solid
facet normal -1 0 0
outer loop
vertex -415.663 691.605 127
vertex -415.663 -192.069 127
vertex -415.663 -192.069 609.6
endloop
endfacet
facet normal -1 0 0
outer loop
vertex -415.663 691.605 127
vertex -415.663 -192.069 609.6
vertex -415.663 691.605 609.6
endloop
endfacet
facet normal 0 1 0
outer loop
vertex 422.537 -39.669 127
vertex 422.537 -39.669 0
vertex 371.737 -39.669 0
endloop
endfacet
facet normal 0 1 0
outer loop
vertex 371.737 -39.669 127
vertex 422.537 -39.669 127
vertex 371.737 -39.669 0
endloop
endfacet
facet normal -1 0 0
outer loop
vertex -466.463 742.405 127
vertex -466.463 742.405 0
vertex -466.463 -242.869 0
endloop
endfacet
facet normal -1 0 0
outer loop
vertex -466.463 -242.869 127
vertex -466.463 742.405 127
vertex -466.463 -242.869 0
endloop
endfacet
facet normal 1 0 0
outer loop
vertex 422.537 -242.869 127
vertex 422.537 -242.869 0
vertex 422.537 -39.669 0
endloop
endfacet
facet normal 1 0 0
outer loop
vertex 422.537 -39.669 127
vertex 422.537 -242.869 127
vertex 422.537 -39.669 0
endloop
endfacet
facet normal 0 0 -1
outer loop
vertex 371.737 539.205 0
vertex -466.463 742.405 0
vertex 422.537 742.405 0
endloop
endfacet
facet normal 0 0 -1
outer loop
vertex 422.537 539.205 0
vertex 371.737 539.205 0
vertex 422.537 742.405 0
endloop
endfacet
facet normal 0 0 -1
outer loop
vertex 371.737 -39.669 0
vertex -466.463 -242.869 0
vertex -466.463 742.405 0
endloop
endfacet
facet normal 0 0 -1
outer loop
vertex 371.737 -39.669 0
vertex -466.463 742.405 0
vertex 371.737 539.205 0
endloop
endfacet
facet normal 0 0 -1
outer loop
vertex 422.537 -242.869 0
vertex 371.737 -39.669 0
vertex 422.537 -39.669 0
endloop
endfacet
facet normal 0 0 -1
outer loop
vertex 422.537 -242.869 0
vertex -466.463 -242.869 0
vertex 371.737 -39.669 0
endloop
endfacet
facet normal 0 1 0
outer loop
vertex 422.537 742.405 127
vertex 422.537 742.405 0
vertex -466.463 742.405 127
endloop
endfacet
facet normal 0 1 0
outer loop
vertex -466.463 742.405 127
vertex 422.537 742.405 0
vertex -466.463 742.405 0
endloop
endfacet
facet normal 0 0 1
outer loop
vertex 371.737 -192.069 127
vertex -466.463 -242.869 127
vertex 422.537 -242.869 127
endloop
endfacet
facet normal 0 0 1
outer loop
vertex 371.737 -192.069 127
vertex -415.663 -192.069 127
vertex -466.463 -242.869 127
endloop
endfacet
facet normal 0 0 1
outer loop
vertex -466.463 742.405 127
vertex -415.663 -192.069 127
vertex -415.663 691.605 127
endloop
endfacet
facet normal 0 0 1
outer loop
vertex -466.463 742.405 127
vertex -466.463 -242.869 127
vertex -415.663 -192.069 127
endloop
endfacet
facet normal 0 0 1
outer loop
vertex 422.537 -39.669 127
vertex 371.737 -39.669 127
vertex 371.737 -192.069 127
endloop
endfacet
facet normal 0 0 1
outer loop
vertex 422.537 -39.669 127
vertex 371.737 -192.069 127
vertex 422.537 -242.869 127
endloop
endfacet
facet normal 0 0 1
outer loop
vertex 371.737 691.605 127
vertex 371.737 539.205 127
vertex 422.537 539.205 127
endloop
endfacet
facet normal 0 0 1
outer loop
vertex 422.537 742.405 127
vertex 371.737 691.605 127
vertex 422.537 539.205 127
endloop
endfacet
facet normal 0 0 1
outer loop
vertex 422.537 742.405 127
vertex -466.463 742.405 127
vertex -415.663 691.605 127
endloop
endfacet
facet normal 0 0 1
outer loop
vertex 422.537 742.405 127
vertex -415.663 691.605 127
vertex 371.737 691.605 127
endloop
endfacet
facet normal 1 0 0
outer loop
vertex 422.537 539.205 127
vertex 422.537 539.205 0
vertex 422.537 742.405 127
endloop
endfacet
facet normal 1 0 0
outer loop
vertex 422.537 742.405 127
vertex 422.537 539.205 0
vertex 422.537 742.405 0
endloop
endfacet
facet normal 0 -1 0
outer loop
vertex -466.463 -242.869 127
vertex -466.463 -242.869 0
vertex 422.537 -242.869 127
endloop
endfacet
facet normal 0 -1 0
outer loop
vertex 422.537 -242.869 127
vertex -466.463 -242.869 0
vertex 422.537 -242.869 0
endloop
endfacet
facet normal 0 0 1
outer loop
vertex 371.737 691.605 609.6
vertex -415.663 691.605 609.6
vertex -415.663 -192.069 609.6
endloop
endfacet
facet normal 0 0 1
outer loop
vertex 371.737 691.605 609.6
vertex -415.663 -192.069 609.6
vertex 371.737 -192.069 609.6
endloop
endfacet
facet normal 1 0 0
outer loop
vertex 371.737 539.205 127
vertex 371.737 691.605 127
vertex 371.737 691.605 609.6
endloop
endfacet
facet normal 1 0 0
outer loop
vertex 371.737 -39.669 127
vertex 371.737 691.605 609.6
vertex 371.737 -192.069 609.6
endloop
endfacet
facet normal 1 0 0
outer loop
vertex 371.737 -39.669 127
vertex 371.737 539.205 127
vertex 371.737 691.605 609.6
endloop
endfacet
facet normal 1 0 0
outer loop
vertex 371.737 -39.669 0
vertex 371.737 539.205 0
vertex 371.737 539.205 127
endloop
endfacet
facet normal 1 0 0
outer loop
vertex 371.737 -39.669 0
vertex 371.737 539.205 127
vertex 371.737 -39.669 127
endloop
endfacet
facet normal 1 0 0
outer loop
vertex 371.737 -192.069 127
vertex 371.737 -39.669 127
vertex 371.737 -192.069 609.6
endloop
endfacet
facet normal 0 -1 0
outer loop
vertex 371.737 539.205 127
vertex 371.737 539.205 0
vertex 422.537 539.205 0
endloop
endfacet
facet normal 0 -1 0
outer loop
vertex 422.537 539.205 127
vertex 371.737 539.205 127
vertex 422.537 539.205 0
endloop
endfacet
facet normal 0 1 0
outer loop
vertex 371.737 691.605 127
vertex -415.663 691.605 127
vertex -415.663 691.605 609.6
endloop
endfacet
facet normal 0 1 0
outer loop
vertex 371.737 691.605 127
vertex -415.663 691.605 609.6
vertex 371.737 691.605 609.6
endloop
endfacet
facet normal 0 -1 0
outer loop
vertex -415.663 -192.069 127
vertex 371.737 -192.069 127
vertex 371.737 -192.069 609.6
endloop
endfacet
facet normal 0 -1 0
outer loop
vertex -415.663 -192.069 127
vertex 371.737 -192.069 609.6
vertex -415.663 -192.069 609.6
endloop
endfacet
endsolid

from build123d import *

# Parameters (mm, degrees)
F2_DEPTH = 127
F4_DEPTH = 609.6


with BuildPart() as f2:
    # F1 (on Top) → F2 (new body)
    with BuildSketch(Plane.XY):
        Polygon((422.536999, 742.405157), (-466.463001, 742.405157), (-466.463001, -242.869017), (422.536999, -242.869017), (422.536999, -39.669017), (371.736999, -39.669017), (371.736999, -192.069017), (-415.663001, -192.069017), (-415.663001, 691.605157), (371.736999, 691.605157), (371.736999, 539.205157), (422.536999, 539.205157), align=None)
    extrude(amount=F2_DEPTH)

    # F3 (on face) → F4 (join)
    with BuildSketch(Plane(origin=(0, 0, 0), x_dir=(1, 0, 0), z_dir=(0, 0, -1))):
        Polygon((371.736999, 39.669017), (371.736999, 192.069017), (-415.663001, 192.069017), (-415.663001, -691.605157), (371.736999, -691.605157), (371.736999, -539.205157), align=None)
    extrude(amount=-F4_DEPTH)


solid = f2.part
